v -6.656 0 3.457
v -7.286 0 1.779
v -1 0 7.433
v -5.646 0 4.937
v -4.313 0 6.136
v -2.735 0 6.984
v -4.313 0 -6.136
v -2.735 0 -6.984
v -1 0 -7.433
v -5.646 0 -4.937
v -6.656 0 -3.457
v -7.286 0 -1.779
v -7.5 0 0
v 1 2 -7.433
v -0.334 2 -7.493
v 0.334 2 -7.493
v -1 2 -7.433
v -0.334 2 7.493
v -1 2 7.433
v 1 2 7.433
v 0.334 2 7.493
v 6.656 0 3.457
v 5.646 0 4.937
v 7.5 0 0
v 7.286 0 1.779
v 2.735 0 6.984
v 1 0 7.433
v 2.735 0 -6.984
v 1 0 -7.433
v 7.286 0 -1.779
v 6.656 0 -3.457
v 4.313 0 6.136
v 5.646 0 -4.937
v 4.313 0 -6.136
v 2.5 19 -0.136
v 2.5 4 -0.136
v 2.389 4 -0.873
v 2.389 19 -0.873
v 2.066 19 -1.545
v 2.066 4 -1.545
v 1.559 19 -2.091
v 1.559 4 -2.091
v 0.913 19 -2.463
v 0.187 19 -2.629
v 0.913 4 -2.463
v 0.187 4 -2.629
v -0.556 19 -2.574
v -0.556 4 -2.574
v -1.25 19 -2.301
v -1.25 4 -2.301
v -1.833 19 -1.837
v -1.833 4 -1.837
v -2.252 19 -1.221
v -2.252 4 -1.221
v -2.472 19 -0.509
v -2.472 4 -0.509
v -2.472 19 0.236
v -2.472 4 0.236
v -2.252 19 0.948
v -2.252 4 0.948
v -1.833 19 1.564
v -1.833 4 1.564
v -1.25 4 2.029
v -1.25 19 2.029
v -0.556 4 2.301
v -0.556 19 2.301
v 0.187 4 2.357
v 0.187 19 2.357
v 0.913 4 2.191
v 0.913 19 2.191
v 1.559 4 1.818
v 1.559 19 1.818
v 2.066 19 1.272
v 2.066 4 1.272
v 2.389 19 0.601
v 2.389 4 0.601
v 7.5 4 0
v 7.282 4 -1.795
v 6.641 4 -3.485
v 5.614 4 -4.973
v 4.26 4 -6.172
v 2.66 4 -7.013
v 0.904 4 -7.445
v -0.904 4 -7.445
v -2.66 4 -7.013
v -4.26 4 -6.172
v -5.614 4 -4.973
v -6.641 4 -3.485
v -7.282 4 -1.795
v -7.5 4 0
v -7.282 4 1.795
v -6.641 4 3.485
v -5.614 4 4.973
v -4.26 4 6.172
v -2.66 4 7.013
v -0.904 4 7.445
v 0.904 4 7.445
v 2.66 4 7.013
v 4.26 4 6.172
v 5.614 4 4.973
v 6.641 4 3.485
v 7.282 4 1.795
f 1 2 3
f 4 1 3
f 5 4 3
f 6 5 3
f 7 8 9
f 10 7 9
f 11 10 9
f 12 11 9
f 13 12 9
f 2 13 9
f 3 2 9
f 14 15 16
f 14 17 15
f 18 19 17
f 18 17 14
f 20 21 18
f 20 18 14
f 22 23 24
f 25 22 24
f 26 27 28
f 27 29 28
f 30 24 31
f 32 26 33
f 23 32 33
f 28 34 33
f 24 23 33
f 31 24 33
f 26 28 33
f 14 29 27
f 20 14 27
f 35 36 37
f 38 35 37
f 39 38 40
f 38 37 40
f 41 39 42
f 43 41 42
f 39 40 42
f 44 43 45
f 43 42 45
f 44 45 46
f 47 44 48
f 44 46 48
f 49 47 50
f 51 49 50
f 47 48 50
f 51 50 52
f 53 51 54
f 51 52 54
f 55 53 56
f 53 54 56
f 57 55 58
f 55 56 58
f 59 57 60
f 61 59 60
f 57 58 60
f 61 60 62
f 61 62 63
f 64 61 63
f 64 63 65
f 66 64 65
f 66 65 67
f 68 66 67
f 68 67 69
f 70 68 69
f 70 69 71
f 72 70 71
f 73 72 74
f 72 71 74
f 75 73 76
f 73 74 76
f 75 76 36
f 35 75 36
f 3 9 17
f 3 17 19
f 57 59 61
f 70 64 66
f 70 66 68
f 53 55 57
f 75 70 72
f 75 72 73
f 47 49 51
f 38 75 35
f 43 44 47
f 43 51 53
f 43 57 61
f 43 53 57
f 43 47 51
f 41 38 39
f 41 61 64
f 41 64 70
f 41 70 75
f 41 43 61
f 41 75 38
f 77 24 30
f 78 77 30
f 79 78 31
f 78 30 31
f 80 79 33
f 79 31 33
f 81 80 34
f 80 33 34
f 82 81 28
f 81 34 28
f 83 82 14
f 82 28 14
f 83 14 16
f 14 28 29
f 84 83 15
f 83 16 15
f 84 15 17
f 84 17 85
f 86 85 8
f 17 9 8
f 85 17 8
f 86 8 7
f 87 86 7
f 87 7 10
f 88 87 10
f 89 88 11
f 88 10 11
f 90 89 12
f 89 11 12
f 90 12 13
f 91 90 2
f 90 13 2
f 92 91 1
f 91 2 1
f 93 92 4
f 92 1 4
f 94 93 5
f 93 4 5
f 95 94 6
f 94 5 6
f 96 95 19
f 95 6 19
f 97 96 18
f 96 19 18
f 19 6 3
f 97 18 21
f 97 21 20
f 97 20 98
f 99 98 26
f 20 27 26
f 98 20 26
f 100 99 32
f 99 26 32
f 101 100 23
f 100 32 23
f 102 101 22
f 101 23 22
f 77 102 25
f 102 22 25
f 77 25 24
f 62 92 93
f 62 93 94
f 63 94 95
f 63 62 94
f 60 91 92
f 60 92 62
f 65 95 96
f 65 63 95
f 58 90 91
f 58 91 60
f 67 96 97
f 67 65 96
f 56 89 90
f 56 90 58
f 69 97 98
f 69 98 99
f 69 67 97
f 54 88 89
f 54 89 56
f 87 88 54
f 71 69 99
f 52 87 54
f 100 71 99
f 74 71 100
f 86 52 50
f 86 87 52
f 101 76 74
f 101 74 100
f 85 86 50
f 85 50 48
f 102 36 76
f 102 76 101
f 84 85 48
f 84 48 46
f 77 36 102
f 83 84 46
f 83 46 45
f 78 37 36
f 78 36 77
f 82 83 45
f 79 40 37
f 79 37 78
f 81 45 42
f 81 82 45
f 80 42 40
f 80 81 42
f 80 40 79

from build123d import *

# Parameters (mm, degrees)
SKETCH_1_R          = 7.5
EXTRUDE_1_DEPTH     = 4
SKETCH_2_R          = 2.5
EXTRUDE_2_DEPTH     = 15
SKETCH_3_W          = 2
SKETCH_3_H          = 15
CUT_EXTRUDE_1_DEPTH = 2


with BuildPart() as part:
    # Эскиз1 → Бобышка-Вытянуть1 (new body)
    with BuildSketch(Plane(origin=(0, 0, 0), x_dir=(1, 0, 0), z_dir=(0, 1, 0))):
        Circle(SKETCH_1_R)
    extrude(amount=EXTRUDE_1_DEPTH)

    # Эскиз2 → Бобышка-Вытянуть2 (add)
    with BuildSketch(Plane(origin=(0, 4, 0), x_dir=(1, 0, 0), z_dir=(0, 1, 0))):
        with Locations((0, 0.136309696)):
            Circle(SKETCH_2_R)
    extrude(amount=EXTRUDE_2_DEPTH)

    # Эскиз3 → Вырез-Вытянуть1 (cut)
    with BuildSketch(Plane.XZ):
        Rectangle(SKETCH_3_W, SKETCH_3_H)
    extrude(amount=-CUT_EXTRUDE_1_DEPTH, mode=Mode.SUBTRACT)


solid = part.part
